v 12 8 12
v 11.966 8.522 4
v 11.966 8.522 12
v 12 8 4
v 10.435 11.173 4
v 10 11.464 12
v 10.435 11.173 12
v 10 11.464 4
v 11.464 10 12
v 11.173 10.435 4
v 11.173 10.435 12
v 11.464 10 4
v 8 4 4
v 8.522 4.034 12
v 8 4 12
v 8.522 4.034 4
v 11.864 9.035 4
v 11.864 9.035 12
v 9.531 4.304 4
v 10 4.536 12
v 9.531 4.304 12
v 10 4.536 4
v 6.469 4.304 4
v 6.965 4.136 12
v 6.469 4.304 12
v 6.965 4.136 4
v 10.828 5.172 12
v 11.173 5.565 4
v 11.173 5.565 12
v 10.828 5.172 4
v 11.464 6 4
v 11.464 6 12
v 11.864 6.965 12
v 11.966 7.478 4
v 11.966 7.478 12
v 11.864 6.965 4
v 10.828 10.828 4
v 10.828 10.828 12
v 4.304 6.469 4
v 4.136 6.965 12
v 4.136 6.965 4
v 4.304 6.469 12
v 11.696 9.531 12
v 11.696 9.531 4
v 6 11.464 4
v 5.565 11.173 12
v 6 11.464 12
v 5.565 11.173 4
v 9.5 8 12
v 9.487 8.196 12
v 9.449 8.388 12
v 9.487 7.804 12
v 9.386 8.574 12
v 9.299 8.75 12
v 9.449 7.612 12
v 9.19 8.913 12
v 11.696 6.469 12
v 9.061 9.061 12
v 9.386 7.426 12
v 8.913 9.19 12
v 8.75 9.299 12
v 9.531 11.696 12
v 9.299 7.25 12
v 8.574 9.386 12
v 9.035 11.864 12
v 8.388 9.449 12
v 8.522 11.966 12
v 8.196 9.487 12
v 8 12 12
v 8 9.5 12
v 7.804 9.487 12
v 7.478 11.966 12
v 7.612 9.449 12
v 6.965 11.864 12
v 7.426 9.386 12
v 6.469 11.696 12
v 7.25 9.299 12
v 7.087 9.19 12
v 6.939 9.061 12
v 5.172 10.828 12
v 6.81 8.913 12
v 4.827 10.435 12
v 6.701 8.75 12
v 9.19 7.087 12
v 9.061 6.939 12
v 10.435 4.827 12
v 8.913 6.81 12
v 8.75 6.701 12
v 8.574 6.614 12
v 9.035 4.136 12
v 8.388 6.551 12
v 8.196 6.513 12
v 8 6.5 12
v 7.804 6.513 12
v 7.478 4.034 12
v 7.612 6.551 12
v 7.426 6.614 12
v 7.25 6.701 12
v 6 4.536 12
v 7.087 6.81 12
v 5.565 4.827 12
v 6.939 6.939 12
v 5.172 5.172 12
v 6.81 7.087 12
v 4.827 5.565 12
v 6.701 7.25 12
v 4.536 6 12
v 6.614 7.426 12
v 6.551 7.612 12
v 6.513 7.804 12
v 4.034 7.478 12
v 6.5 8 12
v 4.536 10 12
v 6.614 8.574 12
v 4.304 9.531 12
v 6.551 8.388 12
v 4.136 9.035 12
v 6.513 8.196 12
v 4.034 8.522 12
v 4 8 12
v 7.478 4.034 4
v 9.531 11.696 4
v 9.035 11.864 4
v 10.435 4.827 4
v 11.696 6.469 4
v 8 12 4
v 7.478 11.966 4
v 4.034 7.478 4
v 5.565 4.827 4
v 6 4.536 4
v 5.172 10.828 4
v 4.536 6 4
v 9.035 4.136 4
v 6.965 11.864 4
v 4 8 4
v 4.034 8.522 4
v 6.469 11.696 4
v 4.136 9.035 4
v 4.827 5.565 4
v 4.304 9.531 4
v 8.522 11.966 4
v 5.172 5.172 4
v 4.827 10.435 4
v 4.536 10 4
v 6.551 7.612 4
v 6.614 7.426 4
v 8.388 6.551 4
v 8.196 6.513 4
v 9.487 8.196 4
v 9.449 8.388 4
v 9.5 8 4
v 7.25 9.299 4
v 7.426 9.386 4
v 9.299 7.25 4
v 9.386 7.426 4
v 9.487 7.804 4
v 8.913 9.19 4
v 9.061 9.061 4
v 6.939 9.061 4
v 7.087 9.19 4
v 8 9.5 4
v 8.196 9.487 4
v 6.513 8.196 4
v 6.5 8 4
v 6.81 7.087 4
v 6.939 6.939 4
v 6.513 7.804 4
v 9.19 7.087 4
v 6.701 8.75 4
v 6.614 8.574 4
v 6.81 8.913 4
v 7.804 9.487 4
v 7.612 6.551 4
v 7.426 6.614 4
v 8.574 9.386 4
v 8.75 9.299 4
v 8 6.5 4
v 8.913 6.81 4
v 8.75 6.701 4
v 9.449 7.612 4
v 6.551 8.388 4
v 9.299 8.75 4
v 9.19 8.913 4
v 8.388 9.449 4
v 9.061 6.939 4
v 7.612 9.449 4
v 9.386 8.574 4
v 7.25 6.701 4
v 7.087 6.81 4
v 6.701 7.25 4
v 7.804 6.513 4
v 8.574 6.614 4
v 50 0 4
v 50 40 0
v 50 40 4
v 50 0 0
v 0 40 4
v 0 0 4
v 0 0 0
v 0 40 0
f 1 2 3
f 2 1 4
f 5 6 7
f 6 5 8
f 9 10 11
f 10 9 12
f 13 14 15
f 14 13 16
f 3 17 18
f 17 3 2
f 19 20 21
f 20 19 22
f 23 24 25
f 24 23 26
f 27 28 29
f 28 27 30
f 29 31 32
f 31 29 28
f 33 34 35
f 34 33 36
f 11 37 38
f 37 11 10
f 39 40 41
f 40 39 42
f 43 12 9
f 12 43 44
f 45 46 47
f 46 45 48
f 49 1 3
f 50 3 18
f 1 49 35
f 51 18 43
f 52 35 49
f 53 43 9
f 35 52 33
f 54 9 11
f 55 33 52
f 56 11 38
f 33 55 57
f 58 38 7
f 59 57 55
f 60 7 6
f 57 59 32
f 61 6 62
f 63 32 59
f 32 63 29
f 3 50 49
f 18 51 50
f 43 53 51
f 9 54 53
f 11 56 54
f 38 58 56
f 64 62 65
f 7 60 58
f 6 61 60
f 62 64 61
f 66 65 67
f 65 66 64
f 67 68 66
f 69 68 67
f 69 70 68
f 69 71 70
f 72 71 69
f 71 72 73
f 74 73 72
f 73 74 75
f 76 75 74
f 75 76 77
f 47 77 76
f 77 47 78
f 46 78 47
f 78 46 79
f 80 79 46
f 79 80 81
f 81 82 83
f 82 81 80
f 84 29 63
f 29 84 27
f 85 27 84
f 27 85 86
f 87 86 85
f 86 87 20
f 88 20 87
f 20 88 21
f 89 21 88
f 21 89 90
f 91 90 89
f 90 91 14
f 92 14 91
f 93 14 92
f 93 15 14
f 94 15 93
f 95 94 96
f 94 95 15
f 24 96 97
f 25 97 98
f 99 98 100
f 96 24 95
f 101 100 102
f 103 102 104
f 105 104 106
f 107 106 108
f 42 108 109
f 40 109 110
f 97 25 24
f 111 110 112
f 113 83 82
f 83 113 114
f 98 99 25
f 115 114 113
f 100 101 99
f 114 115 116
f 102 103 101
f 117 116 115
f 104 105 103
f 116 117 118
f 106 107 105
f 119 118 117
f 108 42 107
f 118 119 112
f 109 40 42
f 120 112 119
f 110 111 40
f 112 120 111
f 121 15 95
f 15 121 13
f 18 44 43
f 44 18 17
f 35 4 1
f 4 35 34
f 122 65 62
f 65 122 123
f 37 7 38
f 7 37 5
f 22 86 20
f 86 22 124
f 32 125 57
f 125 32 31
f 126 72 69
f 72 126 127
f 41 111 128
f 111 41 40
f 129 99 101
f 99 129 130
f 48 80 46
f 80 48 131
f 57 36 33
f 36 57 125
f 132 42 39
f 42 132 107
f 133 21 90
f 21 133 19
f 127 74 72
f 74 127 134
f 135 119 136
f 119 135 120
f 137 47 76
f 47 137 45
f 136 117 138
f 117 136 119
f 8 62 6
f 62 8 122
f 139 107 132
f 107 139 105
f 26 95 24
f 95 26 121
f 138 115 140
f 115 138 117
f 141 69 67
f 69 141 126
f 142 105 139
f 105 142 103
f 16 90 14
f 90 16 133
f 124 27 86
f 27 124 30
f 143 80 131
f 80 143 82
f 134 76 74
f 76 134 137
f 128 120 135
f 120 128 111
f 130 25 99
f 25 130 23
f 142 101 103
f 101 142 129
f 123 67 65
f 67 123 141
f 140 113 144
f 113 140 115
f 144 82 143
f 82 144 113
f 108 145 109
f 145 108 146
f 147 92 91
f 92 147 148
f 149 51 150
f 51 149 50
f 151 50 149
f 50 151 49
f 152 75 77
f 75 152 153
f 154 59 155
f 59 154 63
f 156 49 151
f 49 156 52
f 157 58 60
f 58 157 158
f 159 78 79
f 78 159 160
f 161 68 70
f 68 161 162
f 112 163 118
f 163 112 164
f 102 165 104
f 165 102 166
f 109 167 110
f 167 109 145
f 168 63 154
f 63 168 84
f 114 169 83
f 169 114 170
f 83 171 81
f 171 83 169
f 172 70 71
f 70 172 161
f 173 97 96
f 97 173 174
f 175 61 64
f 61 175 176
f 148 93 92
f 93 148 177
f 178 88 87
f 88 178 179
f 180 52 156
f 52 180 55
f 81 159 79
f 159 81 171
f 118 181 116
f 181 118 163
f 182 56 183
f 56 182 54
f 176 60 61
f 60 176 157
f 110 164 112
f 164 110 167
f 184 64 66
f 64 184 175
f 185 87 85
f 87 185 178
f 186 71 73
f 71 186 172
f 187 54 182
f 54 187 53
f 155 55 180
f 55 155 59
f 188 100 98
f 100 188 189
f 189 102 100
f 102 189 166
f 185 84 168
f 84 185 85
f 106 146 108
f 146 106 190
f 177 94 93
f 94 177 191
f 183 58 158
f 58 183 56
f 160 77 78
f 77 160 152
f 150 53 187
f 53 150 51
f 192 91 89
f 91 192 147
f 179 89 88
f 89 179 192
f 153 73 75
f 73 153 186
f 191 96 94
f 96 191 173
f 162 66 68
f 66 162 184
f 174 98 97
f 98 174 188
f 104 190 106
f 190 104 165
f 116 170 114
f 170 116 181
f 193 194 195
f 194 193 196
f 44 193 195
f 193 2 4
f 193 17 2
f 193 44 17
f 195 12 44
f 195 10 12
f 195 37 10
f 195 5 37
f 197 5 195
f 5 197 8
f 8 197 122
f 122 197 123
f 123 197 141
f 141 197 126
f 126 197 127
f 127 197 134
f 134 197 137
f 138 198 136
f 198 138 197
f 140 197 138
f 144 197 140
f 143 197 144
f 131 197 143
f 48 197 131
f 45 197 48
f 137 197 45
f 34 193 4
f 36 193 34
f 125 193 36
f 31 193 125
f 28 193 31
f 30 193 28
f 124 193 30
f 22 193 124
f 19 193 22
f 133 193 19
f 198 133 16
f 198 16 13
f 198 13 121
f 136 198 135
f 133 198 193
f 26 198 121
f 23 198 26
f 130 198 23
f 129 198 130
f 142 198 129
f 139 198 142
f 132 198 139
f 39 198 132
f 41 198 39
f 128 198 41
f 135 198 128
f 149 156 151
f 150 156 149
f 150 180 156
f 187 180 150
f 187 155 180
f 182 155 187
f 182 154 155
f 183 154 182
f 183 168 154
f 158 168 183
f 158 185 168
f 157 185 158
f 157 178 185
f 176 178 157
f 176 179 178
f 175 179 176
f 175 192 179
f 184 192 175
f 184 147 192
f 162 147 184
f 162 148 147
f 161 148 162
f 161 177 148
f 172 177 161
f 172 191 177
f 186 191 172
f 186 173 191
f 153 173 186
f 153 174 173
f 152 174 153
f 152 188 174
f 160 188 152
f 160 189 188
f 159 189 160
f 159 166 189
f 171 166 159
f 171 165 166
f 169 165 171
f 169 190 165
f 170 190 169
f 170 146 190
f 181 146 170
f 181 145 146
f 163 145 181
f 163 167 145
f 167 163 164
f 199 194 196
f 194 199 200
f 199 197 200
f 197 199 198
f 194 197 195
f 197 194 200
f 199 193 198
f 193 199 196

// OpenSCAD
// units=mm — generated by scad_emitter.py
// part=unnamed
$fn = 48;

union() { cube([50, 40, 4]); difference() { translate([8, 8, 3.5]) rotate([0, 0, 0]) cylinder(h=8.5, r=4, $fn=$fn); translate([8, 8, 3.5]) rotate([0, 0, 0]) cylinder(h=9, r=1.5, $fn=$fn); } }
